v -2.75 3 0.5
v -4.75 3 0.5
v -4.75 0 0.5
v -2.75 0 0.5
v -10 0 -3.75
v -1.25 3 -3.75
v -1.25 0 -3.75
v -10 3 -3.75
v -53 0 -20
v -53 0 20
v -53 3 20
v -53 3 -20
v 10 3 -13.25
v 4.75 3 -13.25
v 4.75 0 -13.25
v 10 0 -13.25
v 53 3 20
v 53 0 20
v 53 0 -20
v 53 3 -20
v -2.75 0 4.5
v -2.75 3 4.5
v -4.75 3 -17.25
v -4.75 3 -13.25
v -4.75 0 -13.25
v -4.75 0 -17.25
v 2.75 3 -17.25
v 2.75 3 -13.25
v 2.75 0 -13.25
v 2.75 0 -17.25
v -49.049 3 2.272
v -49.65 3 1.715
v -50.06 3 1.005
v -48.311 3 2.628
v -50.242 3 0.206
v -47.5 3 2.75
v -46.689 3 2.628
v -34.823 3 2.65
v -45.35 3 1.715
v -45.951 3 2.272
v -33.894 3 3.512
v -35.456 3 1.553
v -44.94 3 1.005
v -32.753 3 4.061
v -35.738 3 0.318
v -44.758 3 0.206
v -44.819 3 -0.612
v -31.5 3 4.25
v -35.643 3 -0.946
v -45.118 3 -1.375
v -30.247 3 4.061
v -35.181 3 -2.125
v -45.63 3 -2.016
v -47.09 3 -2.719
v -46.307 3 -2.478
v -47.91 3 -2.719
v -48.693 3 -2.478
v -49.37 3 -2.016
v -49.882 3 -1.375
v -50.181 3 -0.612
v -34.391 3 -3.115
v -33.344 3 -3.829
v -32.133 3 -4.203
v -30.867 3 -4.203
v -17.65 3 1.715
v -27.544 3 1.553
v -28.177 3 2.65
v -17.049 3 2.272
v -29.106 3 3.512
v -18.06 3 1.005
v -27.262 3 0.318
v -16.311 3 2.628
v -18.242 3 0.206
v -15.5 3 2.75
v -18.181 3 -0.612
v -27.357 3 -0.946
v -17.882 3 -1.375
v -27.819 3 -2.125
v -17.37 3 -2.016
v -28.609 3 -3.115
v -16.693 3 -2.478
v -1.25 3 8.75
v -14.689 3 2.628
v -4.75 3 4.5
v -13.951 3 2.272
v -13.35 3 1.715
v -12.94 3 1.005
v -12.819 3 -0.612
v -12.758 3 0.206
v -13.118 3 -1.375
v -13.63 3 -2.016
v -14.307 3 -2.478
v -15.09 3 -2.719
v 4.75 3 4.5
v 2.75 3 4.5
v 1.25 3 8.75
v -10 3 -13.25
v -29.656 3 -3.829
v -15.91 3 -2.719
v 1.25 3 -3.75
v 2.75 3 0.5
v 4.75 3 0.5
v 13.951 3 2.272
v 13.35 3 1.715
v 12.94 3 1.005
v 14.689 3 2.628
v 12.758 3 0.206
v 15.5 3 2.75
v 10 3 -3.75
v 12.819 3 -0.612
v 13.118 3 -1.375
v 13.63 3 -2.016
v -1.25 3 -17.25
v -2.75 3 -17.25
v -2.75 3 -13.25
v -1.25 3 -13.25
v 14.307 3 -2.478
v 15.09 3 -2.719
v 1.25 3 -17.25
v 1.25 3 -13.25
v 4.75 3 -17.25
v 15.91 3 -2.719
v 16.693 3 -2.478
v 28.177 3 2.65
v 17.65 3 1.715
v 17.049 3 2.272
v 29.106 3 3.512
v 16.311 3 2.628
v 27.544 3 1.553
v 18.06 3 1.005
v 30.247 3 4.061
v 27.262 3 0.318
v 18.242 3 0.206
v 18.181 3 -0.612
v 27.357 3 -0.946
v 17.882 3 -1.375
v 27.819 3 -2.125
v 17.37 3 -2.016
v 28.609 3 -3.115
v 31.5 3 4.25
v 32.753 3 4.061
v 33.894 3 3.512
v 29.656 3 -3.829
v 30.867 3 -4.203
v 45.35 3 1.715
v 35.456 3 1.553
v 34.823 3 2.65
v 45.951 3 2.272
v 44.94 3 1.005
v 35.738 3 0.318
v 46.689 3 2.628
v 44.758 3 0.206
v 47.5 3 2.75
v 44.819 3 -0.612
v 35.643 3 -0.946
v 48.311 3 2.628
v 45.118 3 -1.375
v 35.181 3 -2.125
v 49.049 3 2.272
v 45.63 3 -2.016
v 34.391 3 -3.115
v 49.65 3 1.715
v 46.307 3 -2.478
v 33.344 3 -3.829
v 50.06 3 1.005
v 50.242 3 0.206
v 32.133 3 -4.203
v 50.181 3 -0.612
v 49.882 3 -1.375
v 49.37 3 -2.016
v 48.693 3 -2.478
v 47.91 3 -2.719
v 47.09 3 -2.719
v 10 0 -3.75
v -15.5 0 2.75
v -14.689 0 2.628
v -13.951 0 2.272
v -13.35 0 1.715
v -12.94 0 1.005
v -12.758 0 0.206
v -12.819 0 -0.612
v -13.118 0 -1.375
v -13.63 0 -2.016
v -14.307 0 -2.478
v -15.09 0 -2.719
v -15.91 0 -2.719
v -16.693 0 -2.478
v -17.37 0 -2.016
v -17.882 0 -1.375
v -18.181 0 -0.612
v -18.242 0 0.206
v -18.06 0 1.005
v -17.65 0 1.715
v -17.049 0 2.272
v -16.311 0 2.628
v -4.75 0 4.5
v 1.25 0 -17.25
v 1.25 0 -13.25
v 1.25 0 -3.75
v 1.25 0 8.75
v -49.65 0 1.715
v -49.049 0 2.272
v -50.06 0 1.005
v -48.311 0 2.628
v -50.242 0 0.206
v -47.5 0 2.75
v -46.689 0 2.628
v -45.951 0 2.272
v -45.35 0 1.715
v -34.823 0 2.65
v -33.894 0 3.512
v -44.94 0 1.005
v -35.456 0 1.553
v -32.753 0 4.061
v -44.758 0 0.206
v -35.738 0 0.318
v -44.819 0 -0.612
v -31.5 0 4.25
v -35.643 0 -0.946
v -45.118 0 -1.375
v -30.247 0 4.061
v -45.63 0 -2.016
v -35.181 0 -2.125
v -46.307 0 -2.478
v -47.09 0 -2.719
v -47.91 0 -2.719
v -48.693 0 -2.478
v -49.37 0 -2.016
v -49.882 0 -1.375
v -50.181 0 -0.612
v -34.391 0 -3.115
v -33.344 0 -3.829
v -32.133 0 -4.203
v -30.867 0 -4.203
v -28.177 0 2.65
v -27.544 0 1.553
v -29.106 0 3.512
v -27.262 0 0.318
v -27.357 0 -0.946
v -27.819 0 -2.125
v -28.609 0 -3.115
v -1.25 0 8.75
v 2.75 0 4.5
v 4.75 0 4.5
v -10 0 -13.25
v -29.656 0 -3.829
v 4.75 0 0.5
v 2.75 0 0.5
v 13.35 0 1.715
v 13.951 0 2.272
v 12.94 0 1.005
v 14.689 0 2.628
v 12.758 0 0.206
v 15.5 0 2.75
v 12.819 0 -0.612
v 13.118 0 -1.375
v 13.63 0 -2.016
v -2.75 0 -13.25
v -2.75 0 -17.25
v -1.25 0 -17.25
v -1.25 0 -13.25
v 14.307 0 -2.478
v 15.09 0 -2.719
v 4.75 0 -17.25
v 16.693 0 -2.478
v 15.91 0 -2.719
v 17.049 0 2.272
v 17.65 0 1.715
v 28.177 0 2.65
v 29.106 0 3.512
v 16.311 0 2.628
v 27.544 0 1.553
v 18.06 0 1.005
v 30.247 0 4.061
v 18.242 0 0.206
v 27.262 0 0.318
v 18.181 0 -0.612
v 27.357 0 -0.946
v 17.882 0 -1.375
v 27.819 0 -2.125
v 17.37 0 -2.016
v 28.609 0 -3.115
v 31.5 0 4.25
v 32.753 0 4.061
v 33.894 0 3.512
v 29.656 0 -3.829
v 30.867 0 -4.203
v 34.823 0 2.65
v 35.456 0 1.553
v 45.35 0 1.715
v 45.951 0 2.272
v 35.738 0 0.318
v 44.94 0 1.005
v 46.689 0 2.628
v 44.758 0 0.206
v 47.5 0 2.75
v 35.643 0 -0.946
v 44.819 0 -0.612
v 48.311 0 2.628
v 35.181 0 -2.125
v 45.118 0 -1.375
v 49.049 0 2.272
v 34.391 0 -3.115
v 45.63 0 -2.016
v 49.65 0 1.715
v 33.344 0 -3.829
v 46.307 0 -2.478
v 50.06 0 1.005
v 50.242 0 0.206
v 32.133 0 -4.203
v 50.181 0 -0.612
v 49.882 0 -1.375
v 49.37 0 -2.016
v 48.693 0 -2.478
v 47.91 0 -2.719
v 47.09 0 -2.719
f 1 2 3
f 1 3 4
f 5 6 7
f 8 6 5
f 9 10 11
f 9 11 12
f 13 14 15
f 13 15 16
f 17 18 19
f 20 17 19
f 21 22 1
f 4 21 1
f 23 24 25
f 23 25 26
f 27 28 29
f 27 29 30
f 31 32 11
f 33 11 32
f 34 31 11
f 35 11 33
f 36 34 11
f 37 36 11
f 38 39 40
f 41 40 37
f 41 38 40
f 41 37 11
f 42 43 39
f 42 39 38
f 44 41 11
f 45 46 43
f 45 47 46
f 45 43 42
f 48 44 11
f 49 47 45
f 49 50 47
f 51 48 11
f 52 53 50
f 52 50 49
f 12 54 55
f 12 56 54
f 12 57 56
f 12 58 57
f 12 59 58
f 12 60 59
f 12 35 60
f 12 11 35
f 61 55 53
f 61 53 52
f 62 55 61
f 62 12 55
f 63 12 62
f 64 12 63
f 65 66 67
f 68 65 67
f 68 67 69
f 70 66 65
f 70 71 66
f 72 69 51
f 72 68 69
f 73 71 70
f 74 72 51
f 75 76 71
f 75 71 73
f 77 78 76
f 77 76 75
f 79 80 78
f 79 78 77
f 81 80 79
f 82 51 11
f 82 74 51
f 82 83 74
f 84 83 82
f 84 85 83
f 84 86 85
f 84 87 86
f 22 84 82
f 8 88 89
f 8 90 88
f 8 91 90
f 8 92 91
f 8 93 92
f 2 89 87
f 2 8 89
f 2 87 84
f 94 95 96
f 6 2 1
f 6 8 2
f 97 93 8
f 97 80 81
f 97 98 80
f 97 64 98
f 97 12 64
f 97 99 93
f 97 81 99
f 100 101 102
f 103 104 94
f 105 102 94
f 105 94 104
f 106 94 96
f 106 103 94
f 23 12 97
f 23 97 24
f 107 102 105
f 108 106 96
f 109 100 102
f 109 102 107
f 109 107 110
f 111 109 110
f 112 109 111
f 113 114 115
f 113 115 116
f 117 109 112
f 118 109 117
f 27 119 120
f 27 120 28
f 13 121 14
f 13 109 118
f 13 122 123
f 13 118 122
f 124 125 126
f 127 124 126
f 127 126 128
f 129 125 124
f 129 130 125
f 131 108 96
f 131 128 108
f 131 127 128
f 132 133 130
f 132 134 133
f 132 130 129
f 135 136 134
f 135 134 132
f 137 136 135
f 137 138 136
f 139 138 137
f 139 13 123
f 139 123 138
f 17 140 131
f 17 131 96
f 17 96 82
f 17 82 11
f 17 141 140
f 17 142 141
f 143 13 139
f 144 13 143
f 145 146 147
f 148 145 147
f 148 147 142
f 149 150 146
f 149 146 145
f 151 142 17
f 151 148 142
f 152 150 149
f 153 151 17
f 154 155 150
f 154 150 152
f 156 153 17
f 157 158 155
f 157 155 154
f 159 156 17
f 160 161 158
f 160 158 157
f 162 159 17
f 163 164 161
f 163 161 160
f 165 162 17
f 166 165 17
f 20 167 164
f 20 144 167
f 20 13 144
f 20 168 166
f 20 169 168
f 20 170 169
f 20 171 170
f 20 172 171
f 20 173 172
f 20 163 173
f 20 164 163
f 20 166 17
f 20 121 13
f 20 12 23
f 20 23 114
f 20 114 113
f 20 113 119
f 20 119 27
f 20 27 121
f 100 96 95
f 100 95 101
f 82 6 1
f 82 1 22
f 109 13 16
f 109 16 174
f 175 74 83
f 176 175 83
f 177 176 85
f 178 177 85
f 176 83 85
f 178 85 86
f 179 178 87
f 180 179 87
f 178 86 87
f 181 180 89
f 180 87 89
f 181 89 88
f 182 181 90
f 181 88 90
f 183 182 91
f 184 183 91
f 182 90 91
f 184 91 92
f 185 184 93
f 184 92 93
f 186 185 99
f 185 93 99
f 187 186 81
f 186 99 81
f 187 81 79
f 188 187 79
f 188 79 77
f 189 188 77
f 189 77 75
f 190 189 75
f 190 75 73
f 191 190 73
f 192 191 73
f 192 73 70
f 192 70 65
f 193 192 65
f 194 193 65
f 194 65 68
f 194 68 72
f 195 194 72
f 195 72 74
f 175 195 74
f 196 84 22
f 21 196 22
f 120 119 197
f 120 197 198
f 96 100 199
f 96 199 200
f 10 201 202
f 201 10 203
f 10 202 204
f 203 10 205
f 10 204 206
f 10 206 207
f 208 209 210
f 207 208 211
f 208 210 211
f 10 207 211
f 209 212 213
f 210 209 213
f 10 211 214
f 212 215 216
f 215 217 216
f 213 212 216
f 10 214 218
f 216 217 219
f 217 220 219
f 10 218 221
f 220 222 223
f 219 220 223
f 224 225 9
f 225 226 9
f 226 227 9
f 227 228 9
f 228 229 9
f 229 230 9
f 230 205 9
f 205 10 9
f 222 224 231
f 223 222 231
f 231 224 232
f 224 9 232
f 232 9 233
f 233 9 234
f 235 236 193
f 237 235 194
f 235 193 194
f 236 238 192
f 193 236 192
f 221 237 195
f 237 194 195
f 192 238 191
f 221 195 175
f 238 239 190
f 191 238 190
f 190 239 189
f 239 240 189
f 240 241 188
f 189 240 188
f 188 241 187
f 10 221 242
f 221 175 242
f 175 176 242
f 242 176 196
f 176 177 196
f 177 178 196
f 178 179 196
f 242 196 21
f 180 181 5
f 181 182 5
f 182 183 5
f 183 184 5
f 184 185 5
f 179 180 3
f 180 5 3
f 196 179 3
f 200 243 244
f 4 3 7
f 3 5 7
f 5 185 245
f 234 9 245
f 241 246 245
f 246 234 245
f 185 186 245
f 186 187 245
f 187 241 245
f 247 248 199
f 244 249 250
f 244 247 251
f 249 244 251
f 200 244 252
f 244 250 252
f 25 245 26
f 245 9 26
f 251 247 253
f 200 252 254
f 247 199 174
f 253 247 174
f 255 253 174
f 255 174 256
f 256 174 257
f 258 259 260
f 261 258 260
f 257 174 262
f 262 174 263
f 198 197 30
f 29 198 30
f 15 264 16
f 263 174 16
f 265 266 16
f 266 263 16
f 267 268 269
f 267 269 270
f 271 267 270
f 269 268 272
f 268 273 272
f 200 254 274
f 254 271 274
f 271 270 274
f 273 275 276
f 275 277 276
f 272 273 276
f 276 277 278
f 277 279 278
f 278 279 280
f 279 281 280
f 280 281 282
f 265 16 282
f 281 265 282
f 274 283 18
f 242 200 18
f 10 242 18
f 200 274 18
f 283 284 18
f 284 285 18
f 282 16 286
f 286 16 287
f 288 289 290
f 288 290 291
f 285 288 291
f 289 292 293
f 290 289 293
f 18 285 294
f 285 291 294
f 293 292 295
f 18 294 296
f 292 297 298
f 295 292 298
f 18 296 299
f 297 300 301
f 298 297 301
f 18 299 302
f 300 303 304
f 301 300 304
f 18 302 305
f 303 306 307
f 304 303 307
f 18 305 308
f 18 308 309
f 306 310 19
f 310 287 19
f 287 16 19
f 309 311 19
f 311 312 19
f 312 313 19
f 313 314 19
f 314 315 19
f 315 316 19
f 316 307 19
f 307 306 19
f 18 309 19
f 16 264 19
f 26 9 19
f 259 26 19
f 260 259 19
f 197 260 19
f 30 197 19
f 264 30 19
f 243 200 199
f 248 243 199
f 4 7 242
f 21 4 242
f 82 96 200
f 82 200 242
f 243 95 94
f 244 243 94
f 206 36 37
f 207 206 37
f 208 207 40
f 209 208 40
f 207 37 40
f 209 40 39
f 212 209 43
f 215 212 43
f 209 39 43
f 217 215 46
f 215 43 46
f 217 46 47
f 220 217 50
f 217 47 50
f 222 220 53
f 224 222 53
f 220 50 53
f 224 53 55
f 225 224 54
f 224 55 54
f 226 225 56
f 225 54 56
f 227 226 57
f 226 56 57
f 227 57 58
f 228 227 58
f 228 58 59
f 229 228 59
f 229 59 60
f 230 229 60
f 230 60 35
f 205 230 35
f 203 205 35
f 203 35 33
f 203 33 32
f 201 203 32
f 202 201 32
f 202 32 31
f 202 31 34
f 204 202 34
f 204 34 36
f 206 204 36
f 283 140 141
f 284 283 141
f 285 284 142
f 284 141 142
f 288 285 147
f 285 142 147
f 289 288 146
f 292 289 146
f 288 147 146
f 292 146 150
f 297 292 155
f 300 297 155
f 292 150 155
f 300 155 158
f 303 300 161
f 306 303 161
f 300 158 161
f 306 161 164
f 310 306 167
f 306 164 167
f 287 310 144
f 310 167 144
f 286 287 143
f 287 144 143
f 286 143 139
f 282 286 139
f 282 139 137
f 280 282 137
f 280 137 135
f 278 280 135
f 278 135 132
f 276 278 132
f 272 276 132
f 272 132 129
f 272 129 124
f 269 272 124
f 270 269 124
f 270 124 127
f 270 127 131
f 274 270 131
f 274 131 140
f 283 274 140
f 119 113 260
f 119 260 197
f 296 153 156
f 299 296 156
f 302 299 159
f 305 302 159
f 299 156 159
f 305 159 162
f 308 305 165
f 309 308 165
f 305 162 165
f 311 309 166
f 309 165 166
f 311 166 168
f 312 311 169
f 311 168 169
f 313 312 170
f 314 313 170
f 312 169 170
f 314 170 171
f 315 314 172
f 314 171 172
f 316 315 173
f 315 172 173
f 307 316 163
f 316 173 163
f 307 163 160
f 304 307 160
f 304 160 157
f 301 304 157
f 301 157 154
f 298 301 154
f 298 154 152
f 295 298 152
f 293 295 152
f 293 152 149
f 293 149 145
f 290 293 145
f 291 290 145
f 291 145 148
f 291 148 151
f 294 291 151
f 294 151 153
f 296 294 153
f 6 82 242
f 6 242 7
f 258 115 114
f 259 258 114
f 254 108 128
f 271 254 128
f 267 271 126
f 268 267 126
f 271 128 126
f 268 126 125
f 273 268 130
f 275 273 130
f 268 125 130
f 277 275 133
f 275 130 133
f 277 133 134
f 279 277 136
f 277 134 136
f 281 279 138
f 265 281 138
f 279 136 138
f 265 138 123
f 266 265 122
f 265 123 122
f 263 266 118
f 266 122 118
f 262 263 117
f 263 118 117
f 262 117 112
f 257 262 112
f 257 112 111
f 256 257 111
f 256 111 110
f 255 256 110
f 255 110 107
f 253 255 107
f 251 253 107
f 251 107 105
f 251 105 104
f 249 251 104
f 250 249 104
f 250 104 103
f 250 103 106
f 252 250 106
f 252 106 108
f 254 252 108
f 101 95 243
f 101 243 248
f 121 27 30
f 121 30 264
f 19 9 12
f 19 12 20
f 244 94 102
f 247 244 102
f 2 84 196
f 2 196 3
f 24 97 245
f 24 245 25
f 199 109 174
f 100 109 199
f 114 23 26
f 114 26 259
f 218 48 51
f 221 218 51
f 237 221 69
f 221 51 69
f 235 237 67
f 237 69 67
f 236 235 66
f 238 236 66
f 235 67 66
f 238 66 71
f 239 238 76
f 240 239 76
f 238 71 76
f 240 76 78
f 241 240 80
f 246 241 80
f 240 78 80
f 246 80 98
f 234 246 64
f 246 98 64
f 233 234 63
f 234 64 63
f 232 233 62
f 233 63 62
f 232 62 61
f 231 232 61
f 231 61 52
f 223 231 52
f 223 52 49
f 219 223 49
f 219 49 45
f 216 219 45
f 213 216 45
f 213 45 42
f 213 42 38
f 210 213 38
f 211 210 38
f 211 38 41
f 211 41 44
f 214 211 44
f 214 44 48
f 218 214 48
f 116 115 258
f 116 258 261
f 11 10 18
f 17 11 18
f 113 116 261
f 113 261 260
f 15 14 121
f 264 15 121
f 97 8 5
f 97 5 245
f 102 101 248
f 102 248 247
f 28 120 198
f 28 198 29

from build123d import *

# Parameters (mm, degrees)
SKETCH_1_W          = 106
SKETCH_1_H          = 40
EXTRUDE_1_DEPTH     = 3
CUT_EXTRUDE_1_REACH = 58.727
SKETCH_2_R          = 4.25
SKETCH_2_R_2        = 2.75
CUT_EXTRUDE_2_REACH = 58.727
CUT_EXTRUDE_3_REACH = 58.727
SKETCH_4_W          = 2
SKETCH_4_H          = 4


with BuildPart() as part:
    # 草图1 → 凸台-拉伸1 (new body)
    with BuildSketch(Plane(origin=(0, 0, 0), x_dir=(1, 0, 0), z_dir=(0, 1, 0))):
        Rectangle(SKETCH_1_W, SKETCH_1_H)
    extrude(amount=EXTRUDE_1_DEPTH)

    # 草图2 → 切除-拉伸1 (cut, up to next)
    with BuildSketch(Plane(origin=(0, 3, 0), x_dir=(1, 0, 0), z_dir=(0, 1, 0)), mode=Mode.PRIVATE) as cut_extrude_1_sk1:
        with Locations(Location((-31.5, 0, 0), (0, 0, 270))):
            Circle(SKETCH_2_R)
    cut_extrude_1_tool1 = extrude(cut_extrude_1_sk1.sketch, amount=-CUT_EXTRUDE_1_REACH, mode=Mode.PRIVATE) & part.part
    # 草图2 → 切除-拉伸1 (cut, up to next)
    with BuildSketch(Plane(origin=(0, 3, 0), x_dir=(1, 0, 0), z_dir=(0, 1, 0)), mode=Mode.PRIVATE) as cut_extrude_1_sk2:
        with Locations(Location((31.5, 0, 0), (0, 0, 270))):
            Circle(SKETCH_2_R)
    cut_extrude_1_tool2 = extrude(cut_extrude_1_sk2.sketch, amount=-CUT_EXTRUDE_1_REACH, mode=Mode.PRIVATE) & part.part
    # 草图2 → 切除-拉伸1 (cut, up to next)
    with BuildSketch(Plane(origin=(0, 3, 0), x_dir=(1, 0, 0), z_dir=(0, 1, 0)), mode=Mode.PRIVATE) as cut_extrude_1_sk3:
        with Locations(Location((-47.5, 0, 0), (0, 0, 270))):
            Circle(SKETCH_2_R_2)
    cut_extrude_1_tool3 = extrude(cut_extrude_1_sk3.sketch, amount=-CUT_EXTRUDE_1_REACH, mode=Mode.PRIVATE) & part.part
    # 草图2 → 切除-拉伸1 (cut, up to next)
    with BuildSketch(Plane(origin=(0, 3, 0), x_dir=(1, 0, 0), z_dir=(0, 1, 0)), mode=Mode.PRIVATE) as cut_extrude_1_sk4:
        with Locations(Location((-15.5, 0, 0), (0, 0, 270))):
            Circle(SKETCH_2_R_2)
    cut_extrude_1_tool4 = extrude(cut_extrude_1_sk4.sketch, amount=-CUT_EXTRUDE_1_REACH, mode=Mode.PRIVATE) & part.part
    # 草图2 → 切除-拉伸1 (cut, up to next)
    with BuildSketch(Plane(origin=(0, 3, 0), x_dir=(1, 0, 0), z_dir=(0, 1, 0)), mode=Mode.PRIVATE) as cut_extrude_1_sk5:
        with Locations(Location((15.5, 0, 0), (0, 0, 270))):
            Circle(SKETCH_2_R_2)
    cut_extrude_1_tool5 = extrude(cut_extrude_1_sk5.sketch, amount=-CUT_EXTRUDE_1_REACH, mode=Mode.PRIVATE) & part.part
    # 草图2 → 切除-拉伸1 (cut, up to next)
    with BuildSketch(Plane(origin=(0, 3, 0), x_dir=(1, 0, 0), z_dir=(0, 1, 0)), mode=Mode.PRIVATE) as cut_extrude_1_sk6:
        with Locations(Location((47.5, 0, 0), (0, 0, 270))):
            Circle(SKETCH_2_R_2)
    cut_extrude_1_tool6 = extrude(cut_extrude_1_sk6.sketch, amount=-CUT_EXTRUDE_1_REACH, mode=Mode.PRIVATE) & part.part
    add(cut_extrude_1_tool1.solids().sort_by_distance((-31.5, 3, 0))[0], mode=Mode.SUBTRACT)
    add(cut_extrude_1_tool2.solids().sort_by_distance((31.5, 3, 0))[0], mode=Mode.SUBTRACT)
    add(cut_extrude_1_tool3.solids().sort_by_distance((-47.5, 3, 0))[0], mode=Mode.SUBTRACT)
    add(cut_extrude_1_tool4.solids().sort_by_distance((-15.5, 3, 0))[0], mode=Mode.SUBTRACT)
    add(cut_extrude_1_tool5.solids().sort_by_distance((15.5, 3, 0))[0], mode=Mode.SUBTRACT)
    add(cut_extrude_1_tool6.solids().sort_by_distance((47.5, 3, 0))[0], mode=Mode.SUBTRACT)

    # 草图3 → 切除-拉伸2 (cut, up to next)
    with BuildSketch(Plane(origin=(0, 3, 0), x_dir=(1, 0, 0), z_dir=(0, 1, 0)), mode=Mode.PRIVATE) as cut_extrude_2_sk1:
        Polygon((1.25, 13.25), (10, 13.25), (10, 3.75), (1.25, 3.75), (1.25, -8.75), (-1.25, -8.75), (-1.25, 3.75), (-10, 3.75), (-10, 13.25), (-1.25, 13.25), (-1.25, 17.25), (1.25, 17.25), align=None)
    cut_extrude_2_tool1 = extrude(cut_extrude_2_sk1.sketch, amount=-CUT_EXTRUDE_2_REACH, mode=Mode.PRIVATE) & part.part
    add(cut_extrude_2_tool1.solids().sort_by_distance((0, 3, -7.305405))[0], mode=Mode.SUBTRACT)

    # 草图4 → 切除-拉伸3 (cut, up to next)
    with BuildSketch(Plane(origin=(0, 3, 0), x_dir=(1, 0, 0), z_dir=(0, 1, 0)), mode=Mode.PRIVATE) as cut_extrude_3_sk1:
        with Locations((-3.75, 15.25)):
            Rectangle(SKETCH_4_W, SKETCH_4_H)
    cut_extrude_3_tool1 = extrude(cut_extrude_3_sk1.sketch, amount=-CUT_EXTRUDE_3_REACH, mode=Mode.PRIVATE) & part.part
    # 草图4 → 切除-拉伸3 (cut, up to next)
    with BuildSketch(Plane(origin=(0, 3, 0), x_dir=(1, 0, 0), z_dir=(0, 1, 0)), mode=Mode.PRIVATE) as cut_extrude_3_sk2:
        with Locations((3.75, 15.25)):
            Rectangle(SKETCH_4_W, SKETCH_4_H)
    cut_extrude_3_tool2 = extrude(cut_extrude_3_sk2.sketch, amount=-CUT_EXTRUDE_3_REACH, mode=Mode.PRIVATE) & part.part
    # 草图4 → 切除-拉伸3 (cut, up to next)
    with BuildSketch(Plane(origin=(0, 3, 0), x_dir=(1, 0, 0), z_dir=(0, 1, 0)), mode=Mode.PRIVATE) as cut_extrude_3_sk3:
        with Locations((3.75, -2.5)):
            Rectangle(SKETCH_4_W, SKETCH_4_H)
    cut_extrude_3_tool3 = extrude(cut_extrude_3_sk3.sketch, amount=-CUT_EXTRUDE_3_REACH, mode=Mode.PRIVATE) & part.part
    # 草图4 → 切除-拉伸3 (cut, up to next)
    with BuildSketch(Plane(origin=(0, 3, 0), x_dir=(1, 0, 0), z_dir=(0, 1, 0)), mode=Mode.PRIVATE) as cut_extrude_3_sk4:
        with Locations((-3.75, -2.5)):
            Rectangle(SKETCH_4_W, SKETCH_4_H)
    cut_extrude_3_tool4 = extrude(cut_extrude_3_sk4.sketch, amount=-CUT_EXTRUDE_3_REACH, mode=Mode.PRIVATE) & part.part
    add(cut_extrude_3_tool1.solids().sort_by_distance((-3.75, 3, -15.25))[0], mode=Mode.SUBTRACT)
    add(cut_extrude_3_tool2.solids().sort_by_distance((3.75, 3, -15.25))[0], mode=Mode.SUBTRACT)
    add(cut_extrude_3_tool3.solids().sort_by_distance((3.75, 3, 2.5))[0], mode=Mode.SUBTRACT)
    add(cut_extrude_3_tool4.solids().sort_by_distance((-3.75, 3, 2.5))[0], mode=Mode.SUBTRACT)


solid = part.part
